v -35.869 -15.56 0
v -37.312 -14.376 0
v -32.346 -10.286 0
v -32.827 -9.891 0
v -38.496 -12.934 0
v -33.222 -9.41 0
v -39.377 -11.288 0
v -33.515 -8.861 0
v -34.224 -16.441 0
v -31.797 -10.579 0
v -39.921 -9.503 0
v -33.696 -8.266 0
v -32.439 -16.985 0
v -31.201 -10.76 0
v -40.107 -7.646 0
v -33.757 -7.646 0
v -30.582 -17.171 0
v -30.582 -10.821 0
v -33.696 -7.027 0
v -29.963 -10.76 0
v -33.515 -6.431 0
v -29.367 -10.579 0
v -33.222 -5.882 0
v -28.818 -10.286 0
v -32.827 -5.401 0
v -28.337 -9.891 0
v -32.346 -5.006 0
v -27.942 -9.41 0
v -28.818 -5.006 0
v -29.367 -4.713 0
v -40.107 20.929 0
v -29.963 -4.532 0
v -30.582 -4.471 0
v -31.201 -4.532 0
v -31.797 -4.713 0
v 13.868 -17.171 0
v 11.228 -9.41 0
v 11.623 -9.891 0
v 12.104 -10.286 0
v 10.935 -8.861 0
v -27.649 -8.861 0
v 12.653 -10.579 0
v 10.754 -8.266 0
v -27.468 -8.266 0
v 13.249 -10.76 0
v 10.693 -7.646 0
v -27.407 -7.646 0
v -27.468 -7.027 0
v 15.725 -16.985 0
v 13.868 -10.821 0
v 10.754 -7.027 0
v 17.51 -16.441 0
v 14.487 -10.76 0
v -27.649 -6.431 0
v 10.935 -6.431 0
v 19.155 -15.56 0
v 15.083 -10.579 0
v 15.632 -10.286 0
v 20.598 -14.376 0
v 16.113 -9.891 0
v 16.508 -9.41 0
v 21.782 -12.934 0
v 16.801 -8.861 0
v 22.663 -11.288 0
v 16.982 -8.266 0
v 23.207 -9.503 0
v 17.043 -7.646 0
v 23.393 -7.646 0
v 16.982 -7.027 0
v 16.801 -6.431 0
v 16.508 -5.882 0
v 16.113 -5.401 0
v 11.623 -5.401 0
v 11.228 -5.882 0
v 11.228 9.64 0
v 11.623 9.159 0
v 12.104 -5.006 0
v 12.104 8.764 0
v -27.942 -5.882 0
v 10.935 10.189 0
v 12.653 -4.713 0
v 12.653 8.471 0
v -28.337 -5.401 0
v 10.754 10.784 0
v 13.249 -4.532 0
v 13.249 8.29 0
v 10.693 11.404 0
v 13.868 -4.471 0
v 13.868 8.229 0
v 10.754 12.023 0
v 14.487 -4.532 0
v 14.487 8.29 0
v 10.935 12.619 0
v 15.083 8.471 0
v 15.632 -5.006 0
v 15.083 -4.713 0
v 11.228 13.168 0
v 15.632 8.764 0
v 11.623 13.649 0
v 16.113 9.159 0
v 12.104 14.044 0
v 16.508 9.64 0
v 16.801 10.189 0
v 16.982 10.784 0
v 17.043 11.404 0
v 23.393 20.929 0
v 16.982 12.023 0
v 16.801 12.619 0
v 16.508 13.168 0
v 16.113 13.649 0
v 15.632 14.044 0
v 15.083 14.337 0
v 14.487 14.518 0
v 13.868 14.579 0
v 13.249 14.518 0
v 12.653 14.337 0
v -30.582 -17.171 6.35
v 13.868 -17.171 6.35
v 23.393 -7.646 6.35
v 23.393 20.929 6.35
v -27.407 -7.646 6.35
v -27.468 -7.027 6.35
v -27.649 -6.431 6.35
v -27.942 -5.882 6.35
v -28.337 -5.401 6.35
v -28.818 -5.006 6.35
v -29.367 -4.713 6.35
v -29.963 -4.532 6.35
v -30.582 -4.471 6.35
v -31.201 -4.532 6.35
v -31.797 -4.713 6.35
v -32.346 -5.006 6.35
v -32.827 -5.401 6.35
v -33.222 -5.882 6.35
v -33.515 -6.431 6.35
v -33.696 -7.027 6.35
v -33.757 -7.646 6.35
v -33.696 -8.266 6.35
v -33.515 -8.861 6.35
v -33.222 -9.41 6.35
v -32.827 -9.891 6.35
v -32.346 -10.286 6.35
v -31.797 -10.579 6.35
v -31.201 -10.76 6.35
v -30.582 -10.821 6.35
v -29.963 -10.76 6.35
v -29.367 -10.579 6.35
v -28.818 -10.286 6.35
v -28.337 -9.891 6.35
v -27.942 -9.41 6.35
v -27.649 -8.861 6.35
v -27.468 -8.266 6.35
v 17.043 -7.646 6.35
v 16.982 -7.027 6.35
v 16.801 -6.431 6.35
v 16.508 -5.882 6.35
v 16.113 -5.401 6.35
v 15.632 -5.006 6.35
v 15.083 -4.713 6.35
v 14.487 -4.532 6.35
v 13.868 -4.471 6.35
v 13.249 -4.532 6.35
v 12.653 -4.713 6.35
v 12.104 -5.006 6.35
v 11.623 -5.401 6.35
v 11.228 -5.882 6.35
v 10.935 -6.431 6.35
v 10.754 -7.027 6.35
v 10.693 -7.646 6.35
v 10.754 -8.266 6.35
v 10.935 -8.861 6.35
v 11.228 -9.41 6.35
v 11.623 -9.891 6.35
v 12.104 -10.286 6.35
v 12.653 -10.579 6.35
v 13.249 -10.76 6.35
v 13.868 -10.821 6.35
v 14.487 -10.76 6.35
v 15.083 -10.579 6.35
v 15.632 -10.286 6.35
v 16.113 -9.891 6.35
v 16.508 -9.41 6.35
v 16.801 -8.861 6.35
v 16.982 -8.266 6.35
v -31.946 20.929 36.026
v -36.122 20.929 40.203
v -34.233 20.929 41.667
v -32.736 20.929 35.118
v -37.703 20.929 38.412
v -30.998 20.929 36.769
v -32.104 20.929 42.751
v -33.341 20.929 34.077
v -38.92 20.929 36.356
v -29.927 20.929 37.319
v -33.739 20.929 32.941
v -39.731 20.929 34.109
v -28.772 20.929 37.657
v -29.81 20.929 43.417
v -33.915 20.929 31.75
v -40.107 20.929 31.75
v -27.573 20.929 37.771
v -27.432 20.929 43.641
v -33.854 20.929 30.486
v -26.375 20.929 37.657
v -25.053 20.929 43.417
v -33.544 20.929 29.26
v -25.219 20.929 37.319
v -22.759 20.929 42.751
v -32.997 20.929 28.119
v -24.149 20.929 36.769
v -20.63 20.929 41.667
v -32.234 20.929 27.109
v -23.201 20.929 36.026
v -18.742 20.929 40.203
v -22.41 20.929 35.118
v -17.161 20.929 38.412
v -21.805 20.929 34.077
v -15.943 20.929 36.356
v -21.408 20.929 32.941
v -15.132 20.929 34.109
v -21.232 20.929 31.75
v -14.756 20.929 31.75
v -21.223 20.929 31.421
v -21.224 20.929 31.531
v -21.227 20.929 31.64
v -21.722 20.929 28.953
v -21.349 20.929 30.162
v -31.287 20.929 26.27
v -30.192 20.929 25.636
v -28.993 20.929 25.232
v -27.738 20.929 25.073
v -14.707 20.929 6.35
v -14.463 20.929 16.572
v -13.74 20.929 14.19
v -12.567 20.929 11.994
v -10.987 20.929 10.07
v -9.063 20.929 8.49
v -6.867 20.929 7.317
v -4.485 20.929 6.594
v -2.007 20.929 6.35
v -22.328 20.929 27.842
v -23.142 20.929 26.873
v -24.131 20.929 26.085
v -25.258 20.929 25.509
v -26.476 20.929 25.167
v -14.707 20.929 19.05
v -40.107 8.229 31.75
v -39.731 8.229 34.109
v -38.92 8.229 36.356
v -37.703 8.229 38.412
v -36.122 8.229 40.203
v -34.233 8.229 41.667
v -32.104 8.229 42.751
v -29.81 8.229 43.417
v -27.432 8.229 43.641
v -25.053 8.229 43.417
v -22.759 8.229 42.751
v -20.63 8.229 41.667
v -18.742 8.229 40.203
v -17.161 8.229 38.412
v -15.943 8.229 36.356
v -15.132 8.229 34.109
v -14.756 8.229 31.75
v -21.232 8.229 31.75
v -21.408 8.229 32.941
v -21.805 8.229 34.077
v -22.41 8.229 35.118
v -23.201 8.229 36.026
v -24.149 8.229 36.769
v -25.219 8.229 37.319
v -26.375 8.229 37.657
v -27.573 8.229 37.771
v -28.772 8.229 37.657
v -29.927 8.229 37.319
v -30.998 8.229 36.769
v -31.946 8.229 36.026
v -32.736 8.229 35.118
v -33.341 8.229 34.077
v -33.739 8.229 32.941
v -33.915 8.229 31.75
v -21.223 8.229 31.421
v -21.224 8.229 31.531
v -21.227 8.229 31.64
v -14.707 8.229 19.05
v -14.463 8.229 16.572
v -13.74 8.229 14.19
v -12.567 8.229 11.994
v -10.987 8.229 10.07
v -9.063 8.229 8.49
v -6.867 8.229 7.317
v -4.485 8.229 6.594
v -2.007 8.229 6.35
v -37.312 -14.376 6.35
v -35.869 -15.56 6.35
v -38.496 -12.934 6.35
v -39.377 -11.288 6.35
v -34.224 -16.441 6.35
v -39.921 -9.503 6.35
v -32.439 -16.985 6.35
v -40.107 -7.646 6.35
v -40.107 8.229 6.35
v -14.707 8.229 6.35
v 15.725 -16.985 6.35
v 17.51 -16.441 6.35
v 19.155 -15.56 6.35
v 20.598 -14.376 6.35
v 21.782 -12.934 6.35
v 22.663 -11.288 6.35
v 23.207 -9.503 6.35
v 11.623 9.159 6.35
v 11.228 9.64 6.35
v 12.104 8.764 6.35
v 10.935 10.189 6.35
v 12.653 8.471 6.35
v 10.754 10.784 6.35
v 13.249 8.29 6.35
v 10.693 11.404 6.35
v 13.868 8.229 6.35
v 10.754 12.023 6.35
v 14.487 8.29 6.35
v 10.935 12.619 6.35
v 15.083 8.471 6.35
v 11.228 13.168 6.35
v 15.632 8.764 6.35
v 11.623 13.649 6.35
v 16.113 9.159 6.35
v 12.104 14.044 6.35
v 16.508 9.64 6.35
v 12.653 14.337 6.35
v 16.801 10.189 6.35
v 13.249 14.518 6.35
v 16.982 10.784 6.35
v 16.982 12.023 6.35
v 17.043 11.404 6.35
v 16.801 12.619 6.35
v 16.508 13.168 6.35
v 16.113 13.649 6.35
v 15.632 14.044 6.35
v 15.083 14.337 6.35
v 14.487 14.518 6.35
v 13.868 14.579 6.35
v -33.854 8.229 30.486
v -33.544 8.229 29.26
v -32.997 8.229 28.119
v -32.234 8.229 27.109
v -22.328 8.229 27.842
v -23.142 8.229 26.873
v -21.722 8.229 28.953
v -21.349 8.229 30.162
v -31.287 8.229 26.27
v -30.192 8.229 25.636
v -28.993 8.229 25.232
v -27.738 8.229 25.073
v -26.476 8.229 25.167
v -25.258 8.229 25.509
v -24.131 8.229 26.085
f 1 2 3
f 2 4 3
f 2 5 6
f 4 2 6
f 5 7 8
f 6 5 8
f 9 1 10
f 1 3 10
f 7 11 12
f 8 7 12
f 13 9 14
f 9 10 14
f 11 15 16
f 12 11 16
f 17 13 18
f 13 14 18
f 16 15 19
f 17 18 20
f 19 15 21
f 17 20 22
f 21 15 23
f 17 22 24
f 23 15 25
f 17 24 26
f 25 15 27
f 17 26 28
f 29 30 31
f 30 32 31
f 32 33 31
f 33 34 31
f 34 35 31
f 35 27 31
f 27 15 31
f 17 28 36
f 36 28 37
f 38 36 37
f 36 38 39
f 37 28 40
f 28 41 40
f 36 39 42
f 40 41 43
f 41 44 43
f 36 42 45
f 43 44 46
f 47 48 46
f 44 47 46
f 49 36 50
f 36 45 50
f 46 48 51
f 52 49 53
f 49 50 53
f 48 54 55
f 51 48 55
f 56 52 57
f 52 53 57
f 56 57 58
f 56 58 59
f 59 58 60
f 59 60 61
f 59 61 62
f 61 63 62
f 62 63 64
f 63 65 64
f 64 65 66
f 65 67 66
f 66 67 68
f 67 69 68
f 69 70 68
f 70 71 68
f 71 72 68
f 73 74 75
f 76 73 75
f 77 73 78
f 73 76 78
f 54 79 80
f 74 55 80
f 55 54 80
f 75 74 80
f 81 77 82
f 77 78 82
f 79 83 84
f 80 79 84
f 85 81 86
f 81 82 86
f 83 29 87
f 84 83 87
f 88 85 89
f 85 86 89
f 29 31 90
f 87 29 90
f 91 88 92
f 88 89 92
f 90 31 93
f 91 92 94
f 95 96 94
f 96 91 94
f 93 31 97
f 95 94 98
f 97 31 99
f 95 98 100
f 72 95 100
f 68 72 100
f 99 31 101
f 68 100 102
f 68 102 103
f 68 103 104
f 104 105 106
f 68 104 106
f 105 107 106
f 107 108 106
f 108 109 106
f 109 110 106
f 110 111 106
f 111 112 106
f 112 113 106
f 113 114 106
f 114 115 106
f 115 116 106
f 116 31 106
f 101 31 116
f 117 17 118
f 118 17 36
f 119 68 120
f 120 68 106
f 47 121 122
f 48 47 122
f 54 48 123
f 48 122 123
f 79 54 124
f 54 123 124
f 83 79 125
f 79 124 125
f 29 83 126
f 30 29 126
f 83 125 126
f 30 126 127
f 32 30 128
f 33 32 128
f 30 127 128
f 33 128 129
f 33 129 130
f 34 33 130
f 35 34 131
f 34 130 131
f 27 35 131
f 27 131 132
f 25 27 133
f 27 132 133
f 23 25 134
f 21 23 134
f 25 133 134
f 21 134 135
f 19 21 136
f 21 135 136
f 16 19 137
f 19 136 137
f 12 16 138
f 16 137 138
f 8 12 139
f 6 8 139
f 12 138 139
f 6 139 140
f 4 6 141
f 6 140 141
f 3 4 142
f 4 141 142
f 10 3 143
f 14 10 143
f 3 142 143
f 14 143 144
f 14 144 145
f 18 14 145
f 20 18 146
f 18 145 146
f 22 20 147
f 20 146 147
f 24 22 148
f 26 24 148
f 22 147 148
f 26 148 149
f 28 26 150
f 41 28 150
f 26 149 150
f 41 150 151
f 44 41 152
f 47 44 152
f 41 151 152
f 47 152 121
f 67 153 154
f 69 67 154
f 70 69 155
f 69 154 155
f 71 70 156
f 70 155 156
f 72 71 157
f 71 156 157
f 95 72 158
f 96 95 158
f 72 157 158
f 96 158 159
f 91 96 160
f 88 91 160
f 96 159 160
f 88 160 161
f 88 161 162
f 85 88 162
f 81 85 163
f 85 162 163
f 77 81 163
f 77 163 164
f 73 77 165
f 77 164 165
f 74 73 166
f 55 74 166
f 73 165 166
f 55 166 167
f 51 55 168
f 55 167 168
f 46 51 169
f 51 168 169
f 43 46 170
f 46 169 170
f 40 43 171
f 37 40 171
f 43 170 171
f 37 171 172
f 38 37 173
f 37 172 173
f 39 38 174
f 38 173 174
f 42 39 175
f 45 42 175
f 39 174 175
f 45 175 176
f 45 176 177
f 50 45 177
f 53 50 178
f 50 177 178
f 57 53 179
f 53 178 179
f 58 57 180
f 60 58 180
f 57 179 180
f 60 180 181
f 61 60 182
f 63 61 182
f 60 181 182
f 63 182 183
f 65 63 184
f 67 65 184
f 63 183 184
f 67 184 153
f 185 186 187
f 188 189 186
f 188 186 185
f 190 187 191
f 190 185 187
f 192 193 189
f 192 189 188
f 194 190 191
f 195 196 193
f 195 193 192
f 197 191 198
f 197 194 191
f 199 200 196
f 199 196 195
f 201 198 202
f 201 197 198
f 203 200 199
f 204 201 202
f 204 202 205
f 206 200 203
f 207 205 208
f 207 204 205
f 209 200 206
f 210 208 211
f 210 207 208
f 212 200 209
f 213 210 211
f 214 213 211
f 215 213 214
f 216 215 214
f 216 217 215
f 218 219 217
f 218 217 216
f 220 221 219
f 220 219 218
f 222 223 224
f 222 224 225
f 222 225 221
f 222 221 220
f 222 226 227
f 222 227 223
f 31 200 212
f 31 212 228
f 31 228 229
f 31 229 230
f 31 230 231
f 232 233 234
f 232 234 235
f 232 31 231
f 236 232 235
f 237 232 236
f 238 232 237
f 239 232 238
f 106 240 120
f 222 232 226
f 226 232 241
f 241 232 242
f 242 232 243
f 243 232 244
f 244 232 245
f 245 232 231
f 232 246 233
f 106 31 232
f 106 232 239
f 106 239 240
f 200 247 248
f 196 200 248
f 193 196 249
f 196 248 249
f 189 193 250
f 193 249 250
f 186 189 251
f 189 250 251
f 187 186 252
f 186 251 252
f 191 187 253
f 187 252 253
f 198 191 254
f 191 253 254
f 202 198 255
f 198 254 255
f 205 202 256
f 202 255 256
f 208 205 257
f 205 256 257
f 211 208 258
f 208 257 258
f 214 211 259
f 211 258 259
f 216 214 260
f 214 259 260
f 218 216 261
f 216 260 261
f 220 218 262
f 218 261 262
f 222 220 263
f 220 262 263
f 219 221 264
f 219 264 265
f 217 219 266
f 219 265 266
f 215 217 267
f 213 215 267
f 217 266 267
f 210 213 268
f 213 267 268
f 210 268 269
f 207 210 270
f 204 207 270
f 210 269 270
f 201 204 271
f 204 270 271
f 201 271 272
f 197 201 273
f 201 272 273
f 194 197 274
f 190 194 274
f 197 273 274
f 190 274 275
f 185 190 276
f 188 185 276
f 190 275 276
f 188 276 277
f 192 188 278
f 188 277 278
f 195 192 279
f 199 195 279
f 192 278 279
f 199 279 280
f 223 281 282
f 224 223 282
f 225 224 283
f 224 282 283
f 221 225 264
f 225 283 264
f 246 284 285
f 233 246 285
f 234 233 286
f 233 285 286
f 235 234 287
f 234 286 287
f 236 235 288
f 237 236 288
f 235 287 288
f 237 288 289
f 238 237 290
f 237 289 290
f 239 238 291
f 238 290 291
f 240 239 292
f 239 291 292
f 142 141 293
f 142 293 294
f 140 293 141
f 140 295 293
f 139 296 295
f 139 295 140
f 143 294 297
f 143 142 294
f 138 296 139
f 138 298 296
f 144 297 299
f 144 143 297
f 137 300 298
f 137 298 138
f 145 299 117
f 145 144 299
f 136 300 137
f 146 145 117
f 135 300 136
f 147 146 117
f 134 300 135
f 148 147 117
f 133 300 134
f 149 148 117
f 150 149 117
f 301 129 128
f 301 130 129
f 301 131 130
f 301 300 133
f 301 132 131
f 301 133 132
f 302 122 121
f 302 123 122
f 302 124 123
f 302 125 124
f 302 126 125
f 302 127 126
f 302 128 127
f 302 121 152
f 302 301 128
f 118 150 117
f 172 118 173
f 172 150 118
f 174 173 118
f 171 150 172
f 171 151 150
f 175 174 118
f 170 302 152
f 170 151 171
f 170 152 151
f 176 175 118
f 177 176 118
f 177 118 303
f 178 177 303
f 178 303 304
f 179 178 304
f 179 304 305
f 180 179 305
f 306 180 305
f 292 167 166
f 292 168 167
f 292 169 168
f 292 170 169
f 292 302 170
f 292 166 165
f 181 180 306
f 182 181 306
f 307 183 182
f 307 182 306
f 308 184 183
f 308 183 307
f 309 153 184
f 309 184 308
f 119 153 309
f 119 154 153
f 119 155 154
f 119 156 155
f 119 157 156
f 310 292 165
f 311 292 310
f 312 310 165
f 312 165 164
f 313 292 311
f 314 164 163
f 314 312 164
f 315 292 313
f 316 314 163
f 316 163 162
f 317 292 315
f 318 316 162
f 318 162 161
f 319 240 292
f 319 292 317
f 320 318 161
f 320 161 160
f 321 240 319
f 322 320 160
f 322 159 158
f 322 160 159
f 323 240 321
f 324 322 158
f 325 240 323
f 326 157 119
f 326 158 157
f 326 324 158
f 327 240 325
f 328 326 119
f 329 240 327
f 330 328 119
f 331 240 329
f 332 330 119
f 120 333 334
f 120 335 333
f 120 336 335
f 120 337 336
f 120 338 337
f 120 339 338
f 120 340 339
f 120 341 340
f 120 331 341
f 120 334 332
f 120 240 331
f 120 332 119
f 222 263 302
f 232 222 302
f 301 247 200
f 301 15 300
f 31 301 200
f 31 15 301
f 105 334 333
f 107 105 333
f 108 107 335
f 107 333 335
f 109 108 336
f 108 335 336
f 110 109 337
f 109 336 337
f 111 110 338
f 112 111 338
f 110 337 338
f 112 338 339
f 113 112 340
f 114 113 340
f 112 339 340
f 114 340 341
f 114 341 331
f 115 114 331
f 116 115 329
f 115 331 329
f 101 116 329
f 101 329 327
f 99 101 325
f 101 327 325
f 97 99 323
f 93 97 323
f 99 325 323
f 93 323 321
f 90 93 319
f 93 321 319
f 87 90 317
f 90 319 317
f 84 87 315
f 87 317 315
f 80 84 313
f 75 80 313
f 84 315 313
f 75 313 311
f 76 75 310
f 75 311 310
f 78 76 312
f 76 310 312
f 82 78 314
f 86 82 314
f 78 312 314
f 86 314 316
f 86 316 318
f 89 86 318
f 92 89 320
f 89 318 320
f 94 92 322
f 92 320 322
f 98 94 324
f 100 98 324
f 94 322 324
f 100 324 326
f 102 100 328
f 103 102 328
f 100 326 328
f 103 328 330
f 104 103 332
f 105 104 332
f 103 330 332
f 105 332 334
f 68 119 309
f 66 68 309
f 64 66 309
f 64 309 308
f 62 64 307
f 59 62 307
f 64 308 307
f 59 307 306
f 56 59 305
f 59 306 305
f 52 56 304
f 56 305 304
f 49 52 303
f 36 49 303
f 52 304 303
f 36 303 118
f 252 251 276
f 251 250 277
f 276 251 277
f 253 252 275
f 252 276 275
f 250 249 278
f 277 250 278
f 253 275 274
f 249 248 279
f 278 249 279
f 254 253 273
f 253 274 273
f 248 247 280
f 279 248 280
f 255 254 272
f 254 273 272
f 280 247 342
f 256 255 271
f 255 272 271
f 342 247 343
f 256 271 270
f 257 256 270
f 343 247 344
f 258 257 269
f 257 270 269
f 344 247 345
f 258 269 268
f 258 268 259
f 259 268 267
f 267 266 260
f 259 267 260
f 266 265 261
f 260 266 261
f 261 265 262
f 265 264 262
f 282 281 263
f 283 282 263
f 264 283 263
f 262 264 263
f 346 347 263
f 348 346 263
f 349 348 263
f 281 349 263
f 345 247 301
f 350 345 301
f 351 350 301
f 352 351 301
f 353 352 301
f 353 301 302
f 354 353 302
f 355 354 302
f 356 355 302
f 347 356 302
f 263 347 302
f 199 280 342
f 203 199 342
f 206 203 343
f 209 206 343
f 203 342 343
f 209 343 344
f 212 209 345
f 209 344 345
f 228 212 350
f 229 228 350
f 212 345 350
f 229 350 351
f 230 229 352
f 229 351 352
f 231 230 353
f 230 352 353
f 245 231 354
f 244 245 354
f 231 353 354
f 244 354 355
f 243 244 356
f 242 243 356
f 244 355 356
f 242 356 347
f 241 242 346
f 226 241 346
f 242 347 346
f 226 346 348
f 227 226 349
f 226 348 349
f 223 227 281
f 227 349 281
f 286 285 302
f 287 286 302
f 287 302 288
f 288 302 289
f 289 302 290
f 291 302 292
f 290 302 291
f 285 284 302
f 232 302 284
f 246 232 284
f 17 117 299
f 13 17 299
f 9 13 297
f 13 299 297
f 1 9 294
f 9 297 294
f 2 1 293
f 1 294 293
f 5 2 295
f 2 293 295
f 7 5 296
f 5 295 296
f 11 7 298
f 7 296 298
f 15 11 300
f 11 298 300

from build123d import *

# Parameters (mm, degrees)
F0_W     = 63.5
F0_H     = 38.1
F1_DEPTH = 6.35
F2_R     = 3.175
F3_DEPTH = 6.35
F4_W     = 38.1
F4_H     = 12.7
F5_DEPTH = 38.1
F7_DEPTH = 25.4


with BuildPart() as f1:
    # F0 (on Top) → F1 (new body)
    with BuildSketch(Plane.XY):
        with Locations((-8.3569418639, 1.878844718)):
            Rectangle(F0_W, F0_H)
    extrude(amount=F1_DEPTH)

    # F2 (on face) → F3 (cut)
    with BuildSketch(Plane.XY.offset(6.35)):
        with Locations((-30.5819418639, -7.646155282)):
            Circle(F2_R)
        with Locations((13.8680581361, -7.646155282)):
            Circle(F2_R)
        with Locations((13.8680581361, 11.403844718)):
            Circle(F2_R)
        with BuildLine():
            ThreePointArc((-30.5819418639, -17.171155282), (-37.3117803251, -14.3759937432), (-40.1069418639, -7.646155282))
            Line((-40.1069418639, -7.646155282), (-40.1069418639, -17.171155282))
            Line((-40.1069418639, -17.171155282), (-30.5819418639, -17.171155282))
        make_face()
        with BuildLine():
            ThreePointArc((23.3930581361, -7.646155282), (20.5978084208, -14.3759055667), (13.8680581361, -17.171155282))
            Line((13.8680581361, -17.171155282), (23.3930581361, -17.171155282))
            Line((23.3930581361, -17.171155282), (23.3930581361, -7.646155282))
        make_face()
    extrude(amount=-F3_DEPTH, mode=Mode.SUBTRACT)

    # F4 (on face) → F5 (join)
    with BuildSketch(Plane.XY.offset(6.35)):
        with Locations((-21.0569418639, 14.578844718)):
            Rectangle(F4_W, F4_H)
    extrude(amount=F5_DEPTH)

    # F6 (on face) → F7 (cut)
    with BuildSketch(Plane.XZ.offset(-8.228844718)):
        with BuildLine():
            Line((-33.9147208913, 31.75), (-21.2317441048, 31.75))
            ThreePointArc((-21.2317441048, 31.75), (-27.573232498, 37.771328495), (-33.9147208913, 31.75))
        make_face()
        with BuildLine():
            ThreePointArc((-21.223232498, 31.421328495), (-21.2253607564, 31.5857193445), (-21.2317441048, 31.75))
            Line((-21.2317441048, 31.75), (-33.9147208913, 31.75))
            ThreePointArc((-33.9147208913, 31.75), (-27.7376233476, 25.0734567533), (-21.223232498, 31.421328495))
        make_face()
        with BuildLine():
            Line((-14.7069418639, 6.35), (-14.7069418639, 19.05))
            ThreePointArc((-14.7069418639, 19.05), (-10.987197985, 10.0697438789), (-2.0069418639, 6.35))
            Line((-2.0069418639, 6.35), (-2.0069418639, 31.75))
            Line((-2.0069418639, 31.75), (-14.7562308182, 31.75))
            Line((-14.7562308182, 31.75), (-14.7069418639, 6.35))
        make_face()
        Polygon((-14.7808752954, 44.45), (-14.7562308182, 31.75), (-2.0069418639, 31.75), (-2.0069418639, 44.45), align=None)
        with BuildLine():
            ThreePointArc((-40.1069418639, 31.75), (-27.4315863411, 43.6414101491), (-14.7562308182, 31.75))
            Line((-14.7562308182, 31.75), (-14.7808752954, 44.45))
            Line((-14.7808752954, 44.45), (-40.1069418639, 44.45))
            Line((-40.1069418639, 44.45), (-40.1069418639, 31.75))
        make_face()
    extrude(amount=-F7_DEPTH, mode=Mode.SUBTRACT)


solid = f1.part
